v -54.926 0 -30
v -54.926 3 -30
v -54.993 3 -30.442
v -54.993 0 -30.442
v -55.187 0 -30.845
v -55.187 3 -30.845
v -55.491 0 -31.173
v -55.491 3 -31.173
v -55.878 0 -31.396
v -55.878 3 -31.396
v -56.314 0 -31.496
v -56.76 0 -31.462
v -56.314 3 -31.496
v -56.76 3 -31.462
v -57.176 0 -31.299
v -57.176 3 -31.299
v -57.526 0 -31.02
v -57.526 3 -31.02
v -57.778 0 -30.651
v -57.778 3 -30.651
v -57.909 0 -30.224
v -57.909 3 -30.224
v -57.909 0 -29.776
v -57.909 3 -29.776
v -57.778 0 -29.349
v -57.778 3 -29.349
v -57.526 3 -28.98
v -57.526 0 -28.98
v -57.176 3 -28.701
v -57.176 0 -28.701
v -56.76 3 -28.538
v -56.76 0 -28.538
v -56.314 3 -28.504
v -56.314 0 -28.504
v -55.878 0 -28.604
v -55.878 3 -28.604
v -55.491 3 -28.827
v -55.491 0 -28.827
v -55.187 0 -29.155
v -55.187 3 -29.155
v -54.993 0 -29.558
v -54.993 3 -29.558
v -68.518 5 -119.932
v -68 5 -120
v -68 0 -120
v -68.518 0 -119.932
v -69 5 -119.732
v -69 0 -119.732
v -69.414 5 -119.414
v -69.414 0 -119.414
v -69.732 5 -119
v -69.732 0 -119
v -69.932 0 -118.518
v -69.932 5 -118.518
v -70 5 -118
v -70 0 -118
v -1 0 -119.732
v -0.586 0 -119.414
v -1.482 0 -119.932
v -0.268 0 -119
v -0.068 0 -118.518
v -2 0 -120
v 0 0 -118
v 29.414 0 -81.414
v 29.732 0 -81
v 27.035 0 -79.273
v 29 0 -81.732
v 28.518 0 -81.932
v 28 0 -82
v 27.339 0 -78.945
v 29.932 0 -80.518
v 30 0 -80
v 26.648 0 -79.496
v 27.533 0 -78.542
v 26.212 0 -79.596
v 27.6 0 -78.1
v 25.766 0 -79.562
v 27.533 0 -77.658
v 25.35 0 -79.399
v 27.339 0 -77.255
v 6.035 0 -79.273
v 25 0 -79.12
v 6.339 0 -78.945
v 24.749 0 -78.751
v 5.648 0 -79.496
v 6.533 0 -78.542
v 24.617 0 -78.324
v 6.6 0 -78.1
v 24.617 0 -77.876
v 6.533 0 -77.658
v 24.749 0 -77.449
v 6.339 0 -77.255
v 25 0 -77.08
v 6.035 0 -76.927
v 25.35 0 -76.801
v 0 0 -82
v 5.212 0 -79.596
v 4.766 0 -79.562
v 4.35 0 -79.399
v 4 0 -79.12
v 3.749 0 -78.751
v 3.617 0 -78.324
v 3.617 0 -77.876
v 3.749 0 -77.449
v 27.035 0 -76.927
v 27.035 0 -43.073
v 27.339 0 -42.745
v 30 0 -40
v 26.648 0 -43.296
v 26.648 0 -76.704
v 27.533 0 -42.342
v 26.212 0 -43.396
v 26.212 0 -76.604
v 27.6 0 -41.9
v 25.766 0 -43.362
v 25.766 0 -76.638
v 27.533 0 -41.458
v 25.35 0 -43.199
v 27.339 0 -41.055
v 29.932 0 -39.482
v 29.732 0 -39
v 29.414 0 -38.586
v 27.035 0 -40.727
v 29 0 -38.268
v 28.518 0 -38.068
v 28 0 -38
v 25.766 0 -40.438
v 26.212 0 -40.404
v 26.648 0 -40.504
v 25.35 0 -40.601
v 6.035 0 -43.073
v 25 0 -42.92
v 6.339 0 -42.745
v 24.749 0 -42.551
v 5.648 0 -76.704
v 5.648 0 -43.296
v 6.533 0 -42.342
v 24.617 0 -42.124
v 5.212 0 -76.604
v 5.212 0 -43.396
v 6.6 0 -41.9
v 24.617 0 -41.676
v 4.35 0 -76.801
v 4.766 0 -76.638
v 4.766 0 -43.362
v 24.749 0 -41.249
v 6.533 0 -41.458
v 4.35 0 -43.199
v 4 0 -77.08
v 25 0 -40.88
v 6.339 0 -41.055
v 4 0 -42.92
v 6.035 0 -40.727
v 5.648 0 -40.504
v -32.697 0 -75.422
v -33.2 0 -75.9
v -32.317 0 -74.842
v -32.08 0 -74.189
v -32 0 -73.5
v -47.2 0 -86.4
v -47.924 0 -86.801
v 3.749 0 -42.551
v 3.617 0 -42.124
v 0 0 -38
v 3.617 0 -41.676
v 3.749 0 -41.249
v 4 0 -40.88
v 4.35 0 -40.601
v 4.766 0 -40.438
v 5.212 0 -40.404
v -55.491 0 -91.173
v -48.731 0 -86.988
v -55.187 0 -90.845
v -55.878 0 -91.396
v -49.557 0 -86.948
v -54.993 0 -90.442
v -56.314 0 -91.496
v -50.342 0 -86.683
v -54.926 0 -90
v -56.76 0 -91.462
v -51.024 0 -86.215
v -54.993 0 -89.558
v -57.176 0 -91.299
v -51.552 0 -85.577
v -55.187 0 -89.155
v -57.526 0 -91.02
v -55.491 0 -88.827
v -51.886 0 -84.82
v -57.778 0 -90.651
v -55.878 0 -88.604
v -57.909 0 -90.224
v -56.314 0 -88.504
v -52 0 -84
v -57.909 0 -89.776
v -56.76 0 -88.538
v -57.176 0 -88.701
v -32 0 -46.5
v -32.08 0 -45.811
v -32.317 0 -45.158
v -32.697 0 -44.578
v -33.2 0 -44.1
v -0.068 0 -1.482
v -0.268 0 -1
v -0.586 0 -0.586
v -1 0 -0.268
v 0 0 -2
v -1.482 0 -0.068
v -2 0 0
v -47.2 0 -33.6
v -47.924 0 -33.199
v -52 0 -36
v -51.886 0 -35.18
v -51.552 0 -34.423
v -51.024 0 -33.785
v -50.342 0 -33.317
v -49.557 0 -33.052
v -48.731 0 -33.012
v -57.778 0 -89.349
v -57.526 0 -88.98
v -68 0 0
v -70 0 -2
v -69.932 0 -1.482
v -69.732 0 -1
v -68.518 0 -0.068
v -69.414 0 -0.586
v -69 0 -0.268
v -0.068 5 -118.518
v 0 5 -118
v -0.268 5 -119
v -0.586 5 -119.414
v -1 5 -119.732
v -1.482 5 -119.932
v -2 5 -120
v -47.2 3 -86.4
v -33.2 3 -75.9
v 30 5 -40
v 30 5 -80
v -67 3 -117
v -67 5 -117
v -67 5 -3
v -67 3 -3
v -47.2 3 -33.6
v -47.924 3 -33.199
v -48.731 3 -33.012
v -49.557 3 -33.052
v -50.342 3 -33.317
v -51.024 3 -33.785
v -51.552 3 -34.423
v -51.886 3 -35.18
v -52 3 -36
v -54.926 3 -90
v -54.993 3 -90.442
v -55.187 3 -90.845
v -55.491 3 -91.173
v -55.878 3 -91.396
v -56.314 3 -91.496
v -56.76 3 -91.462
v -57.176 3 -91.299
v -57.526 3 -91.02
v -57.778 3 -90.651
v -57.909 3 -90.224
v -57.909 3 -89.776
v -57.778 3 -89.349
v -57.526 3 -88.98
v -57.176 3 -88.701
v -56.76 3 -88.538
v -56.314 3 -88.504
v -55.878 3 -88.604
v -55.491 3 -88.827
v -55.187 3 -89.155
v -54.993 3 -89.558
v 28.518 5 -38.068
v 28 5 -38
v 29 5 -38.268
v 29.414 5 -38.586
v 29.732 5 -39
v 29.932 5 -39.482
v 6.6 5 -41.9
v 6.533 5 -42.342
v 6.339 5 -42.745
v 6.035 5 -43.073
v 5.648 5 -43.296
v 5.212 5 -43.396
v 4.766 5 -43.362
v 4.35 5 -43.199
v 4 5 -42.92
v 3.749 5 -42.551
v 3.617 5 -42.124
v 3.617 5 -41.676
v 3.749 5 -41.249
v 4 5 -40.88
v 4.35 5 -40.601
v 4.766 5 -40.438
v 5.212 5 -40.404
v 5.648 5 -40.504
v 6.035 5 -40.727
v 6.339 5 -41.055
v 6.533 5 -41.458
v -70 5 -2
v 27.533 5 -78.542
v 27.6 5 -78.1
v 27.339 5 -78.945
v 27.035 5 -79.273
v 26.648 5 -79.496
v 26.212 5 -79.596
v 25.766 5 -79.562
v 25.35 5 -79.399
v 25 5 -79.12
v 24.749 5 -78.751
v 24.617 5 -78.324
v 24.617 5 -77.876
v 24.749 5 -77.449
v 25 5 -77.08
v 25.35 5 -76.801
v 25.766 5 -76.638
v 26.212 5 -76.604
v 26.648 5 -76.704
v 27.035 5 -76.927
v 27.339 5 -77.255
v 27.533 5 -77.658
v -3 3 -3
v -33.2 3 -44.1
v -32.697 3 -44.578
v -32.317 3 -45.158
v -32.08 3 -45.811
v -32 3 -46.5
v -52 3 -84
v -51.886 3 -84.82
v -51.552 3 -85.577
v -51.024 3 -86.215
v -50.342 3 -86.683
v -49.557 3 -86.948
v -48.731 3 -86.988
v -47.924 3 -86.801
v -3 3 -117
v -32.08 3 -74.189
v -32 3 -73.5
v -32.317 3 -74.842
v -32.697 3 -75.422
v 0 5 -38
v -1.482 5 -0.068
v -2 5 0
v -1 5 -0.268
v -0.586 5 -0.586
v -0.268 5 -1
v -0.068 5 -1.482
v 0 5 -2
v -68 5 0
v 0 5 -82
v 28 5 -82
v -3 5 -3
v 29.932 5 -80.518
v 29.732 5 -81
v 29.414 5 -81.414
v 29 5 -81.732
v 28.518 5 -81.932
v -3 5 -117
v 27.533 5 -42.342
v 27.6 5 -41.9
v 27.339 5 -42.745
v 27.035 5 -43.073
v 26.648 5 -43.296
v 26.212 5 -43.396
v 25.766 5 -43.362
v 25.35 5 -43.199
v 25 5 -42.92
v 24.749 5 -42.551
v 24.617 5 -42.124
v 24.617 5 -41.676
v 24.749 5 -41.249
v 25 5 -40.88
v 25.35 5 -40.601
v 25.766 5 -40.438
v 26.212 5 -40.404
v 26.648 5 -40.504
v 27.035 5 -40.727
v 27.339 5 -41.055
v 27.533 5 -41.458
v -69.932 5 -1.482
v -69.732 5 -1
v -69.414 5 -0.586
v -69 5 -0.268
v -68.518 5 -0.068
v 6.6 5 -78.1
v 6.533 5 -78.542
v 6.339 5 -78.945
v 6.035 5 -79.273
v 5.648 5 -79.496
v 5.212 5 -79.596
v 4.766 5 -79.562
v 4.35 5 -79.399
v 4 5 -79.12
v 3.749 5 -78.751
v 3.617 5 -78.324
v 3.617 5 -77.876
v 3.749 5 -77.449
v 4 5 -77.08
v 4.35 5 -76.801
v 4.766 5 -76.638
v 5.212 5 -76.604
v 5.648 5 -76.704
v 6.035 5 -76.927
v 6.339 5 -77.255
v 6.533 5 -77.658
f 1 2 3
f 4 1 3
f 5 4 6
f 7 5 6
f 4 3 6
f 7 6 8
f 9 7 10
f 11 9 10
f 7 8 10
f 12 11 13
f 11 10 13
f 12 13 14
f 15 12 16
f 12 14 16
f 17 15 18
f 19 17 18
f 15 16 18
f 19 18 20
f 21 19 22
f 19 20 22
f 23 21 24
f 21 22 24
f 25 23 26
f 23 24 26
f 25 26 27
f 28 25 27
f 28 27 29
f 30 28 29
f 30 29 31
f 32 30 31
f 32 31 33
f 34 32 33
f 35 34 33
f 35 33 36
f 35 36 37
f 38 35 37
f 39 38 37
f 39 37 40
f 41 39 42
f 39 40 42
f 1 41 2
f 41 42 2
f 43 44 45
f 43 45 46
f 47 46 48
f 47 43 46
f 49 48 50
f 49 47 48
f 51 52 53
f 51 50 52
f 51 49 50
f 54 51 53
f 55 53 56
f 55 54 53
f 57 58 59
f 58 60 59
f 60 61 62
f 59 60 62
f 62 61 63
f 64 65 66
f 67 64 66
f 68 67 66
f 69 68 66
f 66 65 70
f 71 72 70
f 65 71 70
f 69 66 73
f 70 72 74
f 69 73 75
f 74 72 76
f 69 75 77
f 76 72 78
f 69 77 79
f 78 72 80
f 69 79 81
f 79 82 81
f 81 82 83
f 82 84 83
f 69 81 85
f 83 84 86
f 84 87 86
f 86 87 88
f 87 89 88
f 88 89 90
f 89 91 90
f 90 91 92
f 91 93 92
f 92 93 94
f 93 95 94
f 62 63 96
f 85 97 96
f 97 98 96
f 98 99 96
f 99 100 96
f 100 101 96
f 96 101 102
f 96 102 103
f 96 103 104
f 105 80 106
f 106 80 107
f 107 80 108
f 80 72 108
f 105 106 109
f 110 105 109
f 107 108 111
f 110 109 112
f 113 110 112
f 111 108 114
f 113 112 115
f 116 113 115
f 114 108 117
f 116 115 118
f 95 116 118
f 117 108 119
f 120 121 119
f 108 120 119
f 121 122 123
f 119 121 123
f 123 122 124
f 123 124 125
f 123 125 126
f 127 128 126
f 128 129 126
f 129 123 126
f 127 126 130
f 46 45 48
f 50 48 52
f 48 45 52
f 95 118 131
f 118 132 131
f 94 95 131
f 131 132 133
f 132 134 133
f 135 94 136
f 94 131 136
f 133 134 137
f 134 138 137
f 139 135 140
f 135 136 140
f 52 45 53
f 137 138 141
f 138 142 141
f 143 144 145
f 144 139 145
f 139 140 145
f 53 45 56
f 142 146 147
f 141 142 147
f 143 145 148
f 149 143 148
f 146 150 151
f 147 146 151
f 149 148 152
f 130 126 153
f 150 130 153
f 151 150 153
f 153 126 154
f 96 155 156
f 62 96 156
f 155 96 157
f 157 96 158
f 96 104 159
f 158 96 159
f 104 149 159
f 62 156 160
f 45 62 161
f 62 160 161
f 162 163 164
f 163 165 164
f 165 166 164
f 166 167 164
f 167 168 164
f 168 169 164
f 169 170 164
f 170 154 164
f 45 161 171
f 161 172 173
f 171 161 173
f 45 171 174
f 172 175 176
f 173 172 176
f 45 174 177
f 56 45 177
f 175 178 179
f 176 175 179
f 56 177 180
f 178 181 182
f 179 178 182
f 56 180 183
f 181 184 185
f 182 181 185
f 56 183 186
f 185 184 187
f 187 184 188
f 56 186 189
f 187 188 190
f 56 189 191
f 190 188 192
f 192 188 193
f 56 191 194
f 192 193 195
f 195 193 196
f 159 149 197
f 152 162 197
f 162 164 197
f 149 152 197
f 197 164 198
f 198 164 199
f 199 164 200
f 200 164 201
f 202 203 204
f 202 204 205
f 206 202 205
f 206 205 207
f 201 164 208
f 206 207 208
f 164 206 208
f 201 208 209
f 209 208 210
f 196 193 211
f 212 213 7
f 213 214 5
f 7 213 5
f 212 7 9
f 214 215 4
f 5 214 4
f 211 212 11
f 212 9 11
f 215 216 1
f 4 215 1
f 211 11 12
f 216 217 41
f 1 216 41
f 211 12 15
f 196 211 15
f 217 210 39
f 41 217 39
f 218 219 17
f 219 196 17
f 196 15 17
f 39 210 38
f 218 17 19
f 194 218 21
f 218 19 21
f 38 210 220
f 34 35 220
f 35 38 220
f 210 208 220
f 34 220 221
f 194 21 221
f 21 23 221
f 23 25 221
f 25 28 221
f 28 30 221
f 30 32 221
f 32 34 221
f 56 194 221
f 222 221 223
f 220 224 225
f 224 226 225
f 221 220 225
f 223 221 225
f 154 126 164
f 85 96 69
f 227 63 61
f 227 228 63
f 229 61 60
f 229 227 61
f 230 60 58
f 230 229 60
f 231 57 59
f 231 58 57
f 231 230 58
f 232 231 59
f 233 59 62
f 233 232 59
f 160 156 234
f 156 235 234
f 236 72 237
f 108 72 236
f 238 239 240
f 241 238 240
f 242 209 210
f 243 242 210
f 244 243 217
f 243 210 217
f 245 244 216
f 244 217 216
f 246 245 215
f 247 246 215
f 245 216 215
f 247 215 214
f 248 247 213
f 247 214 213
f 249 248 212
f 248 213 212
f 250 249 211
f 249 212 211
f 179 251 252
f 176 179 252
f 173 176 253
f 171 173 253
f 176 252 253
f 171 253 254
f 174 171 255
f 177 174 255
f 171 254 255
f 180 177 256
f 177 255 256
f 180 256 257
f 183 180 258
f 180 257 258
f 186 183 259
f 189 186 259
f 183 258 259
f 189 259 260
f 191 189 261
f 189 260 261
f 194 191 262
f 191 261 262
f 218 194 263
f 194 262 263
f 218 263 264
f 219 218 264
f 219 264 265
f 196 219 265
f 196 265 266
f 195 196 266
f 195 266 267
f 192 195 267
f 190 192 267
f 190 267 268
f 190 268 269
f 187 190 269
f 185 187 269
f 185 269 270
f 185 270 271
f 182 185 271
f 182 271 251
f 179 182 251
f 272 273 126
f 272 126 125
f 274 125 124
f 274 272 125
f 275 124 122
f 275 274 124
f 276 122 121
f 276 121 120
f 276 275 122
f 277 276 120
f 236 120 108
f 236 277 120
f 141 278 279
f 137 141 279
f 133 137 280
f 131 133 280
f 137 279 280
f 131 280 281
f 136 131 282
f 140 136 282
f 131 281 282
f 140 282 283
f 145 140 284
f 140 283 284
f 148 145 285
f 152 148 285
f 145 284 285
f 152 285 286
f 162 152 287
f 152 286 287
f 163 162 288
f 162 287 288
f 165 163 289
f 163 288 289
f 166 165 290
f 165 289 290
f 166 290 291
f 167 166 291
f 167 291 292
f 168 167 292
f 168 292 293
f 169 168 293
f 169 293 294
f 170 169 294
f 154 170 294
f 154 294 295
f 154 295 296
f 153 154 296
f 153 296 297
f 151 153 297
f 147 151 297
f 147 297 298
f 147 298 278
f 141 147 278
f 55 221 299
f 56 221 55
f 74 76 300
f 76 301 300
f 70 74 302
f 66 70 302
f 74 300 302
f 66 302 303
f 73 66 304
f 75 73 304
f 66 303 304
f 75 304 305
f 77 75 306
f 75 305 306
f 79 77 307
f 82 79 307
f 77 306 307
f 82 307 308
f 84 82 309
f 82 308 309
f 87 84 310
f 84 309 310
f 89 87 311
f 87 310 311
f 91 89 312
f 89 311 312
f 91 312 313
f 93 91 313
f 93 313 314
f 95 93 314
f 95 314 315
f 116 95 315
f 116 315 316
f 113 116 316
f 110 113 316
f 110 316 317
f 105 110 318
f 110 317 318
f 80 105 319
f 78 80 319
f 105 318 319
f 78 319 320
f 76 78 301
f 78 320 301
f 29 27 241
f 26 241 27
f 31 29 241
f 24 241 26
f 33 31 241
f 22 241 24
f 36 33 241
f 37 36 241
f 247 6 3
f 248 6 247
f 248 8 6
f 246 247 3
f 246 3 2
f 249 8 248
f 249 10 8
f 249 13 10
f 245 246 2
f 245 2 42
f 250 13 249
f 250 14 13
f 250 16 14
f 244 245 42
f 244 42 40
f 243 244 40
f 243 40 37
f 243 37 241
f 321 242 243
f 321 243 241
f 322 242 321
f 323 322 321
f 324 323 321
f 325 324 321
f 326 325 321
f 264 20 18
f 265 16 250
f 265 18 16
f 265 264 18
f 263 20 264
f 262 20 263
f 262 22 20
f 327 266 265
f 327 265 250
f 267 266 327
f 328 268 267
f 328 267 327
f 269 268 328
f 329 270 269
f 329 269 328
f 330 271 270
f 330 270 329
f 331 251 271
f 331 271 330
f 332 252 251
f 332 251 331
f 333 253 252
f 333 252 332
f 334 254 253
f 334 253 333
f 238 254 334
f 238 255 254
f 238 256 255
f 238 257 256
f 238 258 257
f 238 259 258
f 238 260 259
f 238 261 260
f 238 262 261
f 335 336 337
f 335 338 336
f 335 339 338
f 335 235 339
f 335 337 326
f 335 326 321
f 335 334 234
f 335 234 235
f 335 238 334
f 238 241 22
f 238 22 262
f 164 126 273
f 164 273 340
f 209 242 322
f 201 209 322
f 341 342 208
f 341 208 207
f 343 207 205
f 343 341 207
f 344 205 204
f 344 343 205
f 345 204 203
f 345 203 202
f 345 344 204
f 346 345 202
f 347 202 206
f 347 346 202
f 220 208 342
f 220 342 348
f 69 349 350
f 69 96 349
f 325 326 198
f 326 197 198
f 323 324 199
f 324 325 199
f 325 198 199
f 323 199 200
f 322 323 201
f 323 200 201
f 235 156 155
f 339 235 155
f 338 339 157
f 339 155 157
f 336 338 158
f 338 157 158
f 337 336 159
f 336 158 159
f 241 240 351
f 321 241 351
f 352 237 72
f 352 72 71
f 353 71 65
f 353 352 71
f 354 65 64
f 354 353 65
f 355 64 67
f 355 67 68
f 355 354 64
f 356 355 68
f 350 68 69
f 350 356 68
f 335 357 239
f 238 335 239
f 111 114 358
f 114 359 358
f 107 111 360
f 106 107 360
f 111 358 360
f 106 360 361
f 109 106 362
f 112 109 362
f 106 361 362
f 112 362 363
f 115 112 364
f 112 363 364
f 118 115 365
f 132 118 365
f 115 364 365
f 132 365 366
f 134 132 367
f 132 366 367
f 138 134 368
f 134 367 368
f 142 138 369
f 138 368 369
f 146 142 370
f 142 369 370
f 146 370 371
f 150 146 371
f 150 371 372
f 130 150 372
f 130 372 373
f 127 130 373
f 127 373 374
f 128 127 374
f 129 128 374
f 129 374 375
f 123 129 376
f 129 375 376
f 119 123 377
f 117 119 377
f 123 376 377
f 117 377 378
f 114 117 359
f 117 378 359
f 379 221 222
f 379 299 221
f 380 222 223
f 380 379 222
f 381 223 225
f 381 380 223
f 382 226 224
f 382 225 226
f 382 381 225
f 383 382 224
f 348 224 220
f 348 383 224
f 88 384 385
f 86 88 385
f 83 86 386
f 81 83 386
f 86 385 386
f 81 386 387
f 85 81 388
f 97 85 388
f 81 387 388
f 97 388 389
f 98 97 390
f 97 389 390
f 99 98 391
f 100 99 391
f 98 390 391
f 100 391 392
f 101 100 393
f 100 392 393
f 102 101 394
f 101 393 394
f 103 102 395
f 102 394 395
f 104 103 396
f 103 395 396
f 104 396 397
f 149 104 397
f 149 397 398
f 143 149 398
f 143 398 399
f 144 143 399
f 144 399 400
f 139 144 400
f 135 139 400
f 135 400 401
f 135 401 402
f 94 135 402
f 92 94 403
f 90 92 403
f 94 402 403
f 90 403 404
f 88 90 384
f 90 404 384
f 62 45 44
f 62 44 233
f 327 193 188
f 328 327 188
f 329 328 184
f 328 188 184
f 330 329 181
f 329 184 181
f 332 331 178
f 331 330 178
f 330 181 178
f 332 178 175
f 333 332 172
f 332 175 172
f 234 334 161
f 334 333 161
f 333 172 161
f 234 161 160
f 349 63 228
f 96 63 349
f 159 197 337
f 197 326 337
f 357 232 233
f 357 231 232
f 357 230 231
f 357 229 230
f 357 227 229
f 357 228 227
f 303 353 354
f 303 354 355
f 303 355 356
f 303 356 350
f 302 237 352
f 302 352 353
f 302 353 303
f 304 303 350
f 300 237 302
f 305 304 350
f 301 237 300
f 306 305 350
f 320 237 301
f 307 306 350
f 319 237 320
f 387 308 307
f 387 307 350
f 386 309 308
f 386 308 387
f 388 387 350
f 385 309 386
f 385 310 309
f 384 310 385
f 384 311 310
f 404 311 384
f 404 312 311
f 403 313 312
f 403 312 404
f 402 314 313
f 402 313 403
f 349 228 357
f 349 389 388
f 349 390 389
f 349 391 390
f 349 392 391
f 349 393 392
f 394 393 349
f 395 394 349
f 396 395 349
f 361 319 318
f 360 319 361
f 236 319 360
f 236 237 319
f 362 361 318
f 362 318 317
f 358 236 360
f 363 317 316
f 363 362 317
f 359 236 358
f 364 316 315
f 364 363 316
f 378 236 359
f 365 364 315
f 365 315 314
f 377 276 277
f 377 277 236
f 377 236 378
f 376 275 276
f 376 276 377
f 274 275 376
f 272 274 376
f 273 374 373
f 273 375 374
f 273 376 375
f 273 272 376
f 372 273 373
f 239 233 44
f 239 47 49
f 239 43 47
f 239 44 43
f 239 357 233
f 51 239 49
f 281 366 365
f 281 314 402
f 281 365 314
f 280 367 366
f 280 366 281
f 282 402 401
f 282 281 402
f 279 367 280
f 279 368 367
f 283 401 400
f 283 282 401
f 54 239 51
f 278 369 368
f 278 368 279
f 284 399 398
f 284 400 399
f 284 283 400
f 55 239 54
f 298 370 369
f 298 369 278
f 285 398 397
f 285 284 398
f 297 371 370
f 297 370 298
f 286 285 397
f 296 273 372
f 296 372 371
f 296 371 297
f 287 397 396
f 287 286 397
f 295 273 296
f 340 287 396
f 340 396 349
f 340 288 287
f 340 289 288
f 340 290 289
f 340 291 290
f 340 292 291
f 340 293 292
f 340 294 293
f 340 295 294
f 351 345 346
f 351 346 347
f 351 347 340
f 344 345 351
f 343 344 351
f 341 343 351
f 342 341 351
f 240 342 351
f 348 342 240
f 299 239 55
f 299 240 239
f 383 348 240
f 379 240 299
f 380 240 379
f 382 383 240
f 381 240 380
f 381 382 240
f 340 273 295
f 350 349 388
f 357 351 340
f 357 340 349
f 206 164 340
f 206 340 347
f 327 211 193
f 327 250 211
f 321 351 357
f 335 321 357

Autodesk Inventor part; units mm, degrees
ref_plane "YZ Plane" through (0, 0, 0) normal (1, 0, 0) x (0, 1, 0)
ref_plane "XZ Plane" through (0, 0, 0) normal (0, 1, 0) x (-1, 0, 0)
ref_plane "XY Plane" through (0, 0, 0) normal (0, 0, 1) x (1, 0, 0)
sketch "Sketch1" plane through (0, 0, 0) normal (0, 1, 0) x (-1, 0, 0)
  line L0 (0, 0) -> (70, 0)
  line L1 (70, 0) -> (70, -120)
  line L2 (70, -120) -> (0, -120)
  line L3 (0, -120) -> (0, 0)
  line L4 (0, -82) -> (-30, -82)
  line L5 (-30, -82) -> (-30, -38)
  line L6 (-30, -38) -> (0, -38)
  line L7 (0, -38) -> (0, -82)
  dimension "d0" = 70
  dimension "d1" = 120
  dimension "d2" = 44
  dimension "d3" = 30
  dimension "d4" = 38
  dimension "d5" = 38
extrude "Extrusion1" add sketch "Sketch1" along normal blind 5
sketch "Sketch2" plane through (0, 5, 0) normal (0, 1, 0) x (1, 0, 0)
  line L0 (-67, 3) -> (-3, 3)
  line L1 (-3, 3) -> (-3, 117)
  line L2 (-3, 117) -> (-67, 117)
  line L3 (-67, 117) -> (-67, 3)
  line L4 (-70, 0) -> (0, 0) projected
  line L5 (-70, 120) -> (-70, 0) projected
  line L6 (0, 120) -> (-70, 120) projected
  line L7 (0, 0) -> (0, 38) projected
  dimension "d8" = 3
  dimension "d10" = 3
  dimension "d12" = 3
  dimension "d13" = 3
extrude "Extrusion2" cut sketch "Sketch2" against normal blind 2
sketch "Sketch3" plane through (0, 3, 0) normal (0, 1, 0) x (1, 0, 0)
  line L0 (-52, 30) -> (-52, 90)
  line L1 (-52, 30) -> (-32, 45)
  line L2 (-32, 45) -> (-32, 75)
  line L3 (-32, 75) -> (-52, 90)
  line L4 (-67, 3) -> (-67, 117) projected
  line L5 (-3, 3) -> (-67, 3) projected
  line L6 (-67, 117) -> (-3, 117) projected
  circle A0 centre (-56.4262, 30) radius 1.5
  circle A1 centre (-56.4262, 90) radius 1.5
  point P0 (0, 0)
  dimension "d16" = 60
  dimension "d17" = 30
  dimension "d18" = 15
  dimension "d19" = 20
  dimension "d20" = 42
  dimension "d21" = 42
  dimension "d22" = 27
  dimension "d23" = 27
  dimension "d24" = 3
  dimension "d25" = 3
  dimension "d44" = 27
  dimension "d45" = 27
extrude "Extrusion3" cut sketch "Sketch3" against normal blind 10
fillet "Fillet1" radius 3 4 edges at (-52, 1.5, -30) (-32, 1.5, -45) (-32, 1.5, -75) (-52, 1.5, -90)
fillet "Fillet2" radius 2 6 edges at (0, 2.5, 0) (0, 2.5, -120) (-70, 2.5, -120) (-70, 2.5, 0) (30, 2.5, -38) (30, 2.5, -82)
sketch "Sketch4" plane through (0, 5, 0) normal (0, 1, 0) x (1, 0, 0)
  circle A0 centre (26.1, 41.9) radius 1.5
  line L0 (30, 40) -> (30, 80) projected
  line L1 (0, 38) -> (28, 38) projected
  circle A1 centre (26.1, 78.1) radius 1.5
  line L2 (28, 82) -> (0, 82) projected
  circle A2 centre (5.1, 41.9) radius 1.5
  circle A3 centre (5.1, 78.1) radius 1.5
  point P0 (0, 0)
  dimension "d30" = 3
  dimension "d31" = 3.9
  dimension "d32" = 3.9
  dimension "d33" = 3
  dimension "d34" = 3.9
  dimension "d35" = 3.9
  dimension "d36" = 3
  dimension "d37" = 21
  dimension "d38" = 3
  dimension "d39" = 21
  dimension "d40" = 3.9
  dimension "d41" = 3.9
extrude "Extrusion4" cut sketch "Sketch4" against normal blind 10
equation "\"d4\" = d5"
equation "\"d20\" = d21"
equation "\"d22\" = d23"
equation "\"d44\" = d22"
equation "\"d45\" = d22"
properties part number "drzaksolaru"
